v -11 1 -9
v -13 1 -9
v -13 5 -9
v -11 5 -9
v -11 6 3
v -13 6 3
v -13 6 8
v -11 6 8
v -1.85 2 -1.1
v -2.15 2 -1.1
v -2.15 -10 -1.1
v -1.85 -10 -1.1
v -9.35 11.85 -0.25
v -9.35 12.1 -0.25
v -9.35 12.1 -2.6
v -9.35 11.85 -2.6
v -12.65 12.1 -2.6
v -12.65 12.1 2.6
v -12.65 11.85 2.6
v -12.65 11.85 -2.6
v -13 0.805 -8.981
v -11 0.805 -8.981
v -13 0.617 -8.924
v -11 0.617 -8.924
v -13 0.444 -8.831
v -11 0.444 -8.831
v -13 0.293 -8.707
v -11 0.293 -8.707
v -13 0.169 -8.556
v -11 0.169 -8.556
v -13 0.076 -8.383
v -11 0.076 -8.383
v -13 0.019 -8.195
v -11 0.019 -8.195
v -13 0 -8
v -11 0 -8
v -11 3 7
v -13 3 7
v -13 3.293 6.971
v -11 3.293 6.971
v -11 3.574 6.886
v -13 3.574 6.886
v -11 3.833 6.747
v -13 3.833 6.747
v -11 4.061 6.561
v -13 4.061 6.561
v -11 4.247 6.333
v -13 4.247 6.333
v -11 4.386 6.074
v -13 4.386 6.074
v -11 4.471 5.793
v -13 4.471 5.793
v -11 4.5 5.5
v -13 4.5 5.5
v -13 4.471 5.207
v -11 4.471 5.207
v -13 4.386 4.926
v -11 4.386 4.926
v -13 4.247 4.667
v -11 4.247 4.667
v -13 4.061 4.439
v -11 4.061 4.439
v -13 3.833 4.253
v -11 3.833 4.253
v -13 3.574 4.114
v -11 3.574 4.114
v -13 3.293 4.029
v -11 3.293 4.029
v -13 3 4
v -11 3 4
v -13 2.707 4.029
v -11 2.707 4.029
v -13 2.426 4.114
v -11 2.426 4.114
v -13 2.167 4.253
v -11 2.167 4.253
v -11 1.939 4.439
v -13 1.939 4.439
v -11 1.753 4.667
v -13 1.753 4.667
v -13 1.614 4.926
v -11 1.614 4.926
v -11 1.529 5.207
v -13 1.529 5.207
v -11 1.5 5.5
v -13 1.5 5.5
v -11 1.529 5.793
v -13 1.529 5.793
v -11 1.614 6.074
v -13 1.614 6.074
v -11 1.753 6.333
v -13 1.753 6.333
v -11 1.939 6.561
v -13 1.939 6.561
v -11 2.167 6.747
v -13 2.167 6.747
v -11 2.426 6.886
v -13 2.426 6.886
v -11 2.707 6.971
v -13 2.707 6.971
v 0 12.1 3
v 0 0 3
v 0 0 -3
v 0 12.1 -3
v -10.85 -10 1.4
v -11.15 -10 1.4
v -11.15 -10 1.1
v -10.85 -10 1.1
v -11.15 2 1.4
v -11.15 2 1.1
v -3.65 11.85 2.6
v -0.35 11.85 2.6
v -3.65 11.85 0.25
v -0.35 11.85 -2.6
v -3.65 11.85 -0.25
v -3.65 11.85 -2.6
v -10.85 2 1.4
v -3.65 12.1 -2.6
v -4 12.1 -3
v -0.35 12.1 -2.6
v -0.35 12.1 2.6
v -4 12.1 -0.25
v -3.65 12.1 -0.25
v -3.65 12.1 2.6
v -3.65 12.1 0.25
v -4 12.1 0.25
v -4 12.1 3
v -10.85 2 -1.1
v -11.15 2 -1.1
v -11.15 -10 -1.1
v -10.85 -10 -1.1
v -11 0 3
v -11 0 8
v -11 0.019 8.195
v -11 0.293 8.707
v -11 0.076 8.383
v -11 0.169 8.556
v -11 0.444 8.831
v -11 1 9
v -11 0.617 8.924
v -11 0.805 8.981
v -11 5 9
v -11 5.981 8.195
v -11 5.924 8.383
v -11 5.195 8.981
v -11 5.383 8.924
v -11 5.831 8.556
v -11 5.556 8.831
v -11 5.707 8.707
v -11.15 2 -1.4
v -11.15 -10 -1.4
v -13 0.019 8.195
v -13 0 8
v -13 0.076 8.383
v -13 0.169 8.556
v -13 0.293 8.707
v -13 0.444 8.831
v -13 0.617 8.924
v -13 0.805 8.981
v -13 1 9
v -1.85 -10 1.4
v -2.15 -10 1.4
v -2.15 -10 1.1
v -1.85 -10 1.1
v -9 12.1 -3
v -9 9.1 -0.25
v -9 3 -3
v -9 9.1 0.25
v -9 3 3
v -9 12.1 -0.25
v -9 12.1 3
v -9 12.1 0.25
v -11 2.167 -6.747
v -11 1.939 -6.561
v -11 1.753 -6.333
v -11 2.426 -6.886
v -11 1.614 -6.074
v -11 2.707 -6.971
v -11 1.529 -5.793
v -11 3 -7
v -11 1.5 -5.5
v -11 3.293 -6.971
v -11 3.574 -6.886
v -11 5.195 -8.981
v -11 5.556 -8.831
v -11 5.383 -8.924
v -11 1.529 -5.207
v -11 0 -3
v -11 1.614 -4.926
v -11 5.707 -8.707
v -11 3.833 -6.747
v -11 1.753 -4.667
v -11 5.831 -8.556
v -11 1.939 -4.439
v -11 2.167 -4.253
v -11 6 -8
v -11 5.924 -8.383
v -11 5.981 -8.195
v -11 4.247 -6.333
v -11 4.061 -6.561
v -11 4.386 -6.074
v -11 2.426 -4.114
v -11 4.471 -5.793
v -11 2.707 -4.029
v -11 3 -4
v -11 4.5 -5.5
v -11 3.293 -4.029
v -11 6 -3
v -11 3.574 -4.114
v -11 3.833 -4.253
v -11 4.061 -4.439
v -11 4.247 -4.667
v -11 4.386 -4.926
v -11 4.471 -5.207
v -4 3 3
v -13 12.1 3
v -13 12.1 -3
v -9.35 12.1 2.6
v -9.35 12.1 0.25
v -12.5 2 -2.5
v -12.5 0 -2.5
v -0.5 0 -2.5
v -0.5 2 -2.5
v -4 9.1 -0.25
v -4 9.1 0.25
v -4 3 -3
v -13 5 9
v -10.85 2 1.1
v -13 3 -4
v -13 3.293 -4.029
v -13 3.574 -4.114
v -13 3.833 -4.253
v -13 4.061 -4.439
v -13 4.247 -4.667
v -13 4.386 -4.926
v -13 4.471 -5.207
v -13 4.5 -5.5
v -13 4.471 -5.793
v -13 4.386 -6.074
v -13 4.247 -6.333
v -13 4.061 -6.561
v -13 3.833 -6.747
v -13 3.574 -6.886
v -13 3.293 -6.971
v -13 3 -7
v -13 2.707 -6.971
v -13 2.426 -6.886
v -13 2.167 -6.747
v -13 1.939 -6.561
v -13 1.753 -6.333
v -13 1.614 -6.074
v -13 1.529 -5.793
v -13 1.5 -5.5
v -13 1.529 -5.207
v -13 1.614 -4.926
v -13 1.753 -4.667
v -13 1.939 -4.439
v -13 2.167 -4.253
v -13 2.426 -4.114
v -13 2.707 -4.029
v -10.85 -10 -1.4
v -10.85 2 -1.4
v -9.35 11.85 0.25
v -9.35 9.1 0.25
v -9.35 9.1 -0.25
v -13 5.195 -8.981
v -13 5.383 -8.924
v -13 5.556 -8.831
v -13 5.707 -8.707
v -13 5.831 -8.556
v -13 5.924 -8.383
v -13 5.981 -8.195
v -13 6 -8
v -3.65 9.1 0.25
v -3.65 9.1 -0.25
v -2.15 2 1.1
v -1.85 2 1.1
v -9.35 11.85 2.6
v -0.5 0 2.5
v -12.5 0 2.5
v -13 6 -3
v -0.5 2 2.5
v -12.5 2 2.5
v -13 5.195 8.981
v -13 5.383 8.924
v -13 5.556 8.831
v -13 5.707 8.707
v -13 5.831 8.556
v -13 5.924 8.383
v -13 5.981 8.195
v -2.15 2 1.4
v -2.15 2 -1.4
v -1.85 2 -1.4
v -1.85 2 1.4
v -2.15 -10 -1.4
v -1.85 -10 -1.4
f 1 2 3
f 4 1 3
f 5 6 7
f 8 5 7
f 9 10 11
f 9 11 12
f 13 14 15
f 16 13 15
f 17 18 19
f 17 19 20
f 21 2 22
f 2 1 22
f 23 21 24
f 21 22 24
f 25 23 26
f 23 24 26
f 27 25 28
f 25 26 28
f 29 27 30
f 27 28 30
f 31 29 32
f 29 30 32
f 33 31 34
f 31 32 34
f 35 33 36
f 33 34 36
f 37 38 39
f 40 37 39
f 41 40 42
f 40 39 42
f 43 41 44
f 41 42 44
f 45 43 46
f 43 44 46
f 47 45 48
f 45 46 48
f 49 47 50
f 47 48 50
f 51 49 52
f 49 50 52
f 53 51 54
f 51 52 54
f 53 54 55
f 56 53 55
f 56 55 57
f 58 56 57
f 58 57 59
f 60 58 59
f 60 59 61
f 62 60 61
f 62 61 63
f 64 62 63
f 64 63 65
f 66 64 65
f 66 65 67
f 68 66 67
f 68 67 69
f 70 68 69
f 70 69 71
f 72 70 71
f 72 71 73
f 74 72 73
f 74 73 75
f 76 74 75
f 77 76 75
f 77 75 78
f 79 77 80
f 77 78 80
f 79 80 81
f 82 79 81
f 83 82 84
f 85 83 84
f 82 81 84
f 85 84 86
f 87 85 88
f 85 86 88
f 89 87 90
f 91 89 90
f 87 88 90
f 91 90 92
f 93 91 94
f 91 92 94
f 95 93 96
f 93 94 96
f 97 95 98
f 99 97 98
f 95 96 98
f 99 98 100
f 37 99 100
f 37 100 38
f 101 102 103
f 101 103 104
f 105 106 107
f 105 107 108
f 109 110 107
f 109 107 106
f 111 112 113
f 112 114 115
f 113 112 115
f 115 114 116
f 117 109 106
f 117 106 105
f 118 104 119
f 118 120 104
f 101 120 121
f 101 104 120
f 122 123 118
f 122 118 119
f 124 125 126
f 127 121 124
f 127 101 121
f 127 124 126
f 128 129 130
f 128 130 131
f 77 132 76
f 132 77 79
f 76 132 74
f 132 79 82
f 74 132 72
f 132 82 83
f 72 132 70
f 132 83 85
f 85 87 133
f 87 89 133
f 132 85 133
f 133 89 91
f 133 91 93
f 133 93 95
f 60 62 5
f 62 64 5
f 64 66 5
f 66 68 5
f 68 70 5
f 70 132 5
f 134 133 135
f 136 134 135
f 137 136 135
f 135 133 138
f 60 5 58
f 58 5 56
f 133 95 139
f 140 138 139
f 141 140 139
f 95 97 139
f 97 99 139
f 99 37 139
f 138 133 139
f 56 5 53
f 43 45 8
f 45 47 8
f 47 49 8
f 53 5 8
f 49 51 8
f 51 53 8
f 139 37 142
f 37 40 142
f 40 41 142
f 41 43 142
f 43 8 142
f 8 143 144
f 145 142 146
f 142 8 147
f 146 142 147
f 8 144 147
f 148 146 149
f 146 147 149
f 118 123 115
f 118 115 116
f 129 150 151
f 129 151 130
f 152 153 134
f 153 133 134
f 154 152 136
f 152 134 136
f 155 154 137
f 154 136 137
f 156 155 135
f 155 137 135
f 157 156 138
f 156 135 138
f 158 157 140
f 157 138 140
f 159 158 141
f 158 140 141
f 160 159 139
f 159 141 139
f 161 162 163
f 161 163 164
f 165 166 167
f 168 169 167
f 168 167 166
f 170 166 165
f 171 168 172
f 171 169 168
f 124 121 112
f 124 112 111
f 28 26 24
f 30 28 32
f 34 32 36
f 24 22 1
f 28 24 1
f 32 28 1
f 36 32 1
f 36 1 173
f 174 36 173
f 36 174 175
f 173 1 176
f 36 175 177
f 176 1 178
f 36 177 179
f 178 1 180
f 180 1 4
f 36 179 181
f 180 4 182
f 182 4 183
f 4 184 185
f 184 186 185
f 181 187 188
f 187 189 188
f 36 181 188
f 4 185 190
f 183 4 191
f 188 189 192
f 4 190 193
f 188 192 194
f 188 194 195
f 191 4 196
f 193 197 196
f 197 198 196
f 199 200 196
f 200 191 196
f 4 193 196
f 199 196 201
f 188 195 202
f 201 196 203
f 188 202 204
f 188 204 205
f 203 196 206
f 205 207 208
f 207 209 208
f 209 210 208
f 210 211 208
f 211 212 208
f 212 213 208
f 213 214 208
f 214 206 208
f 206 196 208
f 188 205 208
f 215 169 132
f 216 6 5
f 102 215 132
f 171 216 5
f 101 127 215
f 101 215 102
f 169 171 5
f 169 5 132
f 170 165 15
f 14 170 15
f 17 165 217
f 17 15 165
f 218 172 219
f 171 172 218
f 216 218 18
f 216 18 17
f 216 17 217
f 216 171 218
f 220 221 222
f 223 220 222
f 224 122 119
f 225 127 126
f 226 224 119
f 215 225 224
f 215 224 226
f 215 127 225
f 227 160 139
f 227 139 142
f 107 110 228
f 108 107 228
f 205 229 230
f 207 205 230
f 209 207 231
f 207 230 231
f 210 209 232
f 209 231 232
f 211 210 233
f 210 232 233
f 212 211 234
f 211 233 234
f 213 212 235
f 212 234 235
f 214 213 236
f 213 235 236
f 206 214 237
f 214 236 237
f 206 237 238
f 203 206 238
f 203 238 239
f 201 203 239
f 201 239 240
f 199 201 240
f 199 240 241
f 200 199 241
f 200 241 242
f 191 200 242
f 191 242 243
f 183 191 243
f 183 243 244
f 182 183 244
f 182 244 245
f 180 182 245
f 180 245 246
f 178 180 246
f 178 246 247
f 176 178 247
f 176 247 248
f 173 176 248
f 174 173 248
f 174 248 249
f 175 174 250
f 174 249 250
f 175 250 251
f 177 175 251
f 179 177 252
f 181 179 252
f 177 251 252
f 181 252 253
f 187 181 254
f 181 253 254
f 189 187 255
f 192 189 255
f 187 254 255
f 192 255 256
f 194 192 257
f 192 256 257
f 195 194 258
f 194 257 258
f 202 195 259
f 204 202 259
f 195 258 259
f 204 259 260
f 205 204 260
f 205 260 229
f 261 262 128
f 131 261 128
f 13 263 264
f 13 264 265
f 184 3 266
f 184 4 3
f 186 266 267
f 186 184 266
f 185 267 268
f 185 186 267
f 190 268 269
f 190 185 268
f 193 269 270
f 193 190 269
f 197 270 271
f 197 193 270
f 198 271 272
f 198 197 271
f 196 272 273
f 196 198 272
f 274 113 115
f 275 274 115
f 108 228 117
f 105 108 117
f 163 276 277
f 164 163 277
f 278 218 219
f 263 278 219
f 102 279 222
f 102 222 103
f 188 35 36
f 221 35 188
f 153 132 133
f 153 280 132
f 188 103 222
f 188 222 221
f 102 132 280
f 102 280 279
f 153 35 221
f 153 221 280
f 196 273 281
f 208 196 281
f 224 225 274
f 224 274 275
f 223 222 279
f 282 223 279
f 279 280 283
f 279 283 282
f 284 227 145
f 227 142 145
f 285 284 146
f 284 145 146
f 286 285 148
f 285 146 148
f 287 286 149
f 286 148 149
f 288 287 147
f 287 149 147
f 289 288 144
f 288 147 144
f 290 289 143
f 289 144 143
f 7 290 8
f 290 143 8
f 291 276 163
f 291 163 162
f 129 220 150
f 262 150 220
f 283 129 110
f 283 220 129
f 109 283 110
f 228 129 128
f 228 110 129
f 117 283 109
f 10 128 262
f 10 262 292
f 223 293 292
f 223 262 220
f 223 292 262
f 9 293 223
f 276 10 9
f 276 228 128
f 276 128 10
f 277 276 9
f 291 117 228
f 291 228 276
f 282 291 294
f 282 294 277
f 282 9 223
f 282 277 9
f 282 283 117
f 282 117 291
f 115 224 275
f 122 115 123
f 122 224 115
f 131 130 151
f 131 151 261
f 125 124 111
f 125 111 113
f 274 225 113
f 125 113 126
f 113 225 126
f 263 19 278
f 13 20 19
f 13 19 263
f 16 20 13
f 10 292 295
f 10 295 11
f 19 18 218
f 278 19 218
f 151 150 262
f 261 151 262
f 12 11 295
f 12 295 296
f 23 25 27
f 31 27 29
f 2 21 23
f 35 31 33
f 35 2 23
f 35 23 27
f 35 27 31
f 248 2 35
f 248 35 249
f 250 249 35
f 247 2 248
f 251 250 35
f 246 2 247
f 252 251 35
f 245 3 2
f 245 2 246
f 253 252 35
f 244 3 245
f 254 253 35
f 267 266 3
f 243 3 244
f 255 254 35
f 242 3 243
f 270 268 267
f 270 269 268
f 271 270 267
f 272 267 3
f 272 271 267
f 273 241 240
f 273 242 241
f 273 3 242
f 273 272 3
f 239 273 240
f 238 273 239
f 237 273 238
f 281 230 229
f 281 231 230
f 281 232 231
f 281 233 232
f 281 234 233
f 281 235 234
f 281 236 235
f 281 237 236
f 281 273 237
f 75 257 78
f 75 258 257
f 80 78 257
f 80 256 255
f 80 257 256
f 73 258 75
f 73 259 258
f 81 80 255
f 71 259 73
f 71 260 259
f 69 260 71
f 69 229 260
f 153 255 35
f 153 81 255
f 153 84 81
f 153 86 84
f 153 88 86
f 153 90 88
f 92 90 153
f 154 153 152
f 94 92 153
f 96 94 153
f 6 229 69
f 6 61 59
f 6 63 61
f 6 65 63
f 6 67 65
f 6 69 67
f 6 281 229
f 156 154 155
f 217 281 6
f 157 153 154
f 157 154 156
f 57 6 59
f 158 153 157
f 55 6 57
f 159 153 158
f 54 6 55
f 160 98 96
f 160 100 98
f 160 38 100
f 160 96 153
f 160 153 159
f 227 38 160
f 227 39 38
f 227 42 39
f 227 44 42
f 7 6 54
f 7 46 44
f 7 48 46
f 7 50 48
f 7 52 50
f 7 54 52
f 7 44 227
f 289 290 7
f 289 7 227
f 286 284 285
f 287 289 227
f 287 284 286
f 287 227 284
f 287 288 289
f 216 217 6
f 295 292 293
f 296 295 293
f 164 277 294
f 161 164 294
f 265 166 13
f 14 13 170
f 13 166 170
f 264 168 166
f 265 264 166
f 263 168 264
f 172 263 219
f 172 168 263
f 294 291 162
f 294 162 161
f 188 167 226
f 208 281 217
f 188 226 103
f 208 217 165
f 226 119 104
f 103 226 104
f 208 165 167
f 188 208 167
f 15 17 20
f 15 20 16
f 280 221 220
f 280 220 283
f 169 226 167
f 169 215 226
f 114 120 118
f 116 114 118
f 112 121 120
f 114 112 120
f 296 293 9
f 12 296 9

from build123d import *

# Parameters (mm, degrees)
BOSS_EXTRUDE1_DEPTH  = 3
SKETCH3_W            = 18
SKETCH3_H            = 6
BOSS_EXTRUDE2_DEPTH  = 2
SKETCH4_R            = 1.5
CUT_EXTRUDE1_DEPTH   = 14
FILLET1_R            = 1
SKETCH5_W            = 3.3
SKETCH5_H            = 5.2
CUT_EXTRUDE2_DEPTH   = 0.25
SKETCH6_W            = 0.5
SKETCH6_H            = 3
CUT_EXTRUDE3_DEPTH   = 0.35
SKETCH7_W            = 12
SKETCH7_H            = 5
CUT_EXTRUDE4_DEPTH   = 2
SKETCH8_W            = 0.3
SKETCH8_H            = 0.3
BOSS_EXTRUDE3_DEPTH  = 12
LPATTERN1_COUNT      = 2
LPATTERN1_PITCH      = 9
LPATTERN1_COUNT_DIR2 = 2
LPATTERN1_PITCH_DIR2 = 2.5


with BuildPart() as part:
    # Sketch1 → Boss-Extrude1 (new body, symmetric)
    with BuildSketch(Plane.XY):
        Polygon((-9, 12.1), (-13, 12.1), (-13, 0), (0, 0), (0, 12.1), (-4, 12.1), (-4, 3), (-9, 3), align=None)
    extrude(amount=BOSS_EXTRUDE1_DEPTH, both=True)

    # Sketch3 → Boss-Extrude2 (add)
    with BuildSketch(Plane.ZY.offset(13)):
        with Locations((0, 3)):
            Rectangle(SKETCH3_W, SKETCH3_H)
    extrude(amount=-BOSS_EXTRUDE2_DEPTH)

    # Sketch4 → Cut-Extrude1 (cut, through all)
    with BuildSketch(Plane.ZY.offset(13)):
        with Locations((-5.5, 3)):
            Circle(SKETCH4_R)
        with Locations((5.5, 3)):
            Circle(SKETCH4_R)
    extrude(amount=-CUT_EXTRUDE1_DEPTH, mode=Mode.SUBTRACT)

    # Fillet1
    fillet1_edges = [part.edges().sort_by_distance(p)[0] for p in [
        (-12, 6, -9),
        (-12, 0, -9),
        (-12, 6, 9),
        (-12, 0, 9),
    ]]
    fillet(fillet1_edges, radius=FILLET1_R)

    # Sketch5 → Cut-Extrude2 (cut)
    with BuildSketch(Plane(origin=(0, 12.1, 0), x_dir=(1, 0, 0), z_dir=(0, 1, 0))):
        with Locations((-11, 0)):
            Rectangle(SKETCH5_W, SKETCH5_H)
    cut_extrude2 = extrude(amount=-CUT_EXTRUDE2_DEPTH, mode=Mode.SUBTRACT)

    # Sketch6 → Cut-Extrude3 (cut)
    with BuildSketch(Plane(origin=(-9, 0, 0), x_dir=(0, 0, -1), z_dir=(1, 0, 0))):
        with Locations((0, 10.6)):
            Rectangle(SKETCH6_W, SKETCH6_H)
    cut_extrude3 = extrude(amount=-CUT_EXTRUDE3_DEPTH, mode=Mode.SUBTRACT)

    # Mirror1: Cut-Extrude2, Cut-Extrude3 across plane
    add(cut_extrude2.mirror(Plane(origin=(-6.5, 0, 0), x_dir=(0, 0, 1), z_dir=(1, 0, 0))), mode=Mode.SUBTRACT)
    add(cut_extrude3.mirror(Plane(origin=(-6.5, 0, 0), x_dir=(0, 0, 1), z_dir=(1, 0, 0))), mode=Mode.SUBTRACT)

    # Sketch7 → Cut-Extrude4 (cut)
    with BuildSketch(Plane.XZ):
        with Locations((-6.5, 0)):
            Rectangle(SKETCH7_W, SKETCH7_H)
    extrude(amount=-CUT_EXTRUDE4_DEPTH, mode=Mode.SUBTRACT)

    # Sketch8 → Boss-Extrude3 (add)
    with BuildSketch(Plane.XZ.offset(-2)):
        with Locations((-11, 1.25)):
            Rectangle(SKETCH8_W, SKETCH8_H)
    boss_extrude3 = extrude(amount=BOSS_EXTRUDE3_DEPTH)

    # LPattern1: Boss-Extrude3 2 × 2
    with Locations(*[(i * LPATTERN1_PITCH, 0, -j * LPATTERN1_PITCH_DIR2) for i in range(LPATTERN1_COUNT) for j in range(LPATTERN1_COUNT_DIR2) if (i, j) != (0, 0)]):
        add(boss_extrude3)


solid = part.part
